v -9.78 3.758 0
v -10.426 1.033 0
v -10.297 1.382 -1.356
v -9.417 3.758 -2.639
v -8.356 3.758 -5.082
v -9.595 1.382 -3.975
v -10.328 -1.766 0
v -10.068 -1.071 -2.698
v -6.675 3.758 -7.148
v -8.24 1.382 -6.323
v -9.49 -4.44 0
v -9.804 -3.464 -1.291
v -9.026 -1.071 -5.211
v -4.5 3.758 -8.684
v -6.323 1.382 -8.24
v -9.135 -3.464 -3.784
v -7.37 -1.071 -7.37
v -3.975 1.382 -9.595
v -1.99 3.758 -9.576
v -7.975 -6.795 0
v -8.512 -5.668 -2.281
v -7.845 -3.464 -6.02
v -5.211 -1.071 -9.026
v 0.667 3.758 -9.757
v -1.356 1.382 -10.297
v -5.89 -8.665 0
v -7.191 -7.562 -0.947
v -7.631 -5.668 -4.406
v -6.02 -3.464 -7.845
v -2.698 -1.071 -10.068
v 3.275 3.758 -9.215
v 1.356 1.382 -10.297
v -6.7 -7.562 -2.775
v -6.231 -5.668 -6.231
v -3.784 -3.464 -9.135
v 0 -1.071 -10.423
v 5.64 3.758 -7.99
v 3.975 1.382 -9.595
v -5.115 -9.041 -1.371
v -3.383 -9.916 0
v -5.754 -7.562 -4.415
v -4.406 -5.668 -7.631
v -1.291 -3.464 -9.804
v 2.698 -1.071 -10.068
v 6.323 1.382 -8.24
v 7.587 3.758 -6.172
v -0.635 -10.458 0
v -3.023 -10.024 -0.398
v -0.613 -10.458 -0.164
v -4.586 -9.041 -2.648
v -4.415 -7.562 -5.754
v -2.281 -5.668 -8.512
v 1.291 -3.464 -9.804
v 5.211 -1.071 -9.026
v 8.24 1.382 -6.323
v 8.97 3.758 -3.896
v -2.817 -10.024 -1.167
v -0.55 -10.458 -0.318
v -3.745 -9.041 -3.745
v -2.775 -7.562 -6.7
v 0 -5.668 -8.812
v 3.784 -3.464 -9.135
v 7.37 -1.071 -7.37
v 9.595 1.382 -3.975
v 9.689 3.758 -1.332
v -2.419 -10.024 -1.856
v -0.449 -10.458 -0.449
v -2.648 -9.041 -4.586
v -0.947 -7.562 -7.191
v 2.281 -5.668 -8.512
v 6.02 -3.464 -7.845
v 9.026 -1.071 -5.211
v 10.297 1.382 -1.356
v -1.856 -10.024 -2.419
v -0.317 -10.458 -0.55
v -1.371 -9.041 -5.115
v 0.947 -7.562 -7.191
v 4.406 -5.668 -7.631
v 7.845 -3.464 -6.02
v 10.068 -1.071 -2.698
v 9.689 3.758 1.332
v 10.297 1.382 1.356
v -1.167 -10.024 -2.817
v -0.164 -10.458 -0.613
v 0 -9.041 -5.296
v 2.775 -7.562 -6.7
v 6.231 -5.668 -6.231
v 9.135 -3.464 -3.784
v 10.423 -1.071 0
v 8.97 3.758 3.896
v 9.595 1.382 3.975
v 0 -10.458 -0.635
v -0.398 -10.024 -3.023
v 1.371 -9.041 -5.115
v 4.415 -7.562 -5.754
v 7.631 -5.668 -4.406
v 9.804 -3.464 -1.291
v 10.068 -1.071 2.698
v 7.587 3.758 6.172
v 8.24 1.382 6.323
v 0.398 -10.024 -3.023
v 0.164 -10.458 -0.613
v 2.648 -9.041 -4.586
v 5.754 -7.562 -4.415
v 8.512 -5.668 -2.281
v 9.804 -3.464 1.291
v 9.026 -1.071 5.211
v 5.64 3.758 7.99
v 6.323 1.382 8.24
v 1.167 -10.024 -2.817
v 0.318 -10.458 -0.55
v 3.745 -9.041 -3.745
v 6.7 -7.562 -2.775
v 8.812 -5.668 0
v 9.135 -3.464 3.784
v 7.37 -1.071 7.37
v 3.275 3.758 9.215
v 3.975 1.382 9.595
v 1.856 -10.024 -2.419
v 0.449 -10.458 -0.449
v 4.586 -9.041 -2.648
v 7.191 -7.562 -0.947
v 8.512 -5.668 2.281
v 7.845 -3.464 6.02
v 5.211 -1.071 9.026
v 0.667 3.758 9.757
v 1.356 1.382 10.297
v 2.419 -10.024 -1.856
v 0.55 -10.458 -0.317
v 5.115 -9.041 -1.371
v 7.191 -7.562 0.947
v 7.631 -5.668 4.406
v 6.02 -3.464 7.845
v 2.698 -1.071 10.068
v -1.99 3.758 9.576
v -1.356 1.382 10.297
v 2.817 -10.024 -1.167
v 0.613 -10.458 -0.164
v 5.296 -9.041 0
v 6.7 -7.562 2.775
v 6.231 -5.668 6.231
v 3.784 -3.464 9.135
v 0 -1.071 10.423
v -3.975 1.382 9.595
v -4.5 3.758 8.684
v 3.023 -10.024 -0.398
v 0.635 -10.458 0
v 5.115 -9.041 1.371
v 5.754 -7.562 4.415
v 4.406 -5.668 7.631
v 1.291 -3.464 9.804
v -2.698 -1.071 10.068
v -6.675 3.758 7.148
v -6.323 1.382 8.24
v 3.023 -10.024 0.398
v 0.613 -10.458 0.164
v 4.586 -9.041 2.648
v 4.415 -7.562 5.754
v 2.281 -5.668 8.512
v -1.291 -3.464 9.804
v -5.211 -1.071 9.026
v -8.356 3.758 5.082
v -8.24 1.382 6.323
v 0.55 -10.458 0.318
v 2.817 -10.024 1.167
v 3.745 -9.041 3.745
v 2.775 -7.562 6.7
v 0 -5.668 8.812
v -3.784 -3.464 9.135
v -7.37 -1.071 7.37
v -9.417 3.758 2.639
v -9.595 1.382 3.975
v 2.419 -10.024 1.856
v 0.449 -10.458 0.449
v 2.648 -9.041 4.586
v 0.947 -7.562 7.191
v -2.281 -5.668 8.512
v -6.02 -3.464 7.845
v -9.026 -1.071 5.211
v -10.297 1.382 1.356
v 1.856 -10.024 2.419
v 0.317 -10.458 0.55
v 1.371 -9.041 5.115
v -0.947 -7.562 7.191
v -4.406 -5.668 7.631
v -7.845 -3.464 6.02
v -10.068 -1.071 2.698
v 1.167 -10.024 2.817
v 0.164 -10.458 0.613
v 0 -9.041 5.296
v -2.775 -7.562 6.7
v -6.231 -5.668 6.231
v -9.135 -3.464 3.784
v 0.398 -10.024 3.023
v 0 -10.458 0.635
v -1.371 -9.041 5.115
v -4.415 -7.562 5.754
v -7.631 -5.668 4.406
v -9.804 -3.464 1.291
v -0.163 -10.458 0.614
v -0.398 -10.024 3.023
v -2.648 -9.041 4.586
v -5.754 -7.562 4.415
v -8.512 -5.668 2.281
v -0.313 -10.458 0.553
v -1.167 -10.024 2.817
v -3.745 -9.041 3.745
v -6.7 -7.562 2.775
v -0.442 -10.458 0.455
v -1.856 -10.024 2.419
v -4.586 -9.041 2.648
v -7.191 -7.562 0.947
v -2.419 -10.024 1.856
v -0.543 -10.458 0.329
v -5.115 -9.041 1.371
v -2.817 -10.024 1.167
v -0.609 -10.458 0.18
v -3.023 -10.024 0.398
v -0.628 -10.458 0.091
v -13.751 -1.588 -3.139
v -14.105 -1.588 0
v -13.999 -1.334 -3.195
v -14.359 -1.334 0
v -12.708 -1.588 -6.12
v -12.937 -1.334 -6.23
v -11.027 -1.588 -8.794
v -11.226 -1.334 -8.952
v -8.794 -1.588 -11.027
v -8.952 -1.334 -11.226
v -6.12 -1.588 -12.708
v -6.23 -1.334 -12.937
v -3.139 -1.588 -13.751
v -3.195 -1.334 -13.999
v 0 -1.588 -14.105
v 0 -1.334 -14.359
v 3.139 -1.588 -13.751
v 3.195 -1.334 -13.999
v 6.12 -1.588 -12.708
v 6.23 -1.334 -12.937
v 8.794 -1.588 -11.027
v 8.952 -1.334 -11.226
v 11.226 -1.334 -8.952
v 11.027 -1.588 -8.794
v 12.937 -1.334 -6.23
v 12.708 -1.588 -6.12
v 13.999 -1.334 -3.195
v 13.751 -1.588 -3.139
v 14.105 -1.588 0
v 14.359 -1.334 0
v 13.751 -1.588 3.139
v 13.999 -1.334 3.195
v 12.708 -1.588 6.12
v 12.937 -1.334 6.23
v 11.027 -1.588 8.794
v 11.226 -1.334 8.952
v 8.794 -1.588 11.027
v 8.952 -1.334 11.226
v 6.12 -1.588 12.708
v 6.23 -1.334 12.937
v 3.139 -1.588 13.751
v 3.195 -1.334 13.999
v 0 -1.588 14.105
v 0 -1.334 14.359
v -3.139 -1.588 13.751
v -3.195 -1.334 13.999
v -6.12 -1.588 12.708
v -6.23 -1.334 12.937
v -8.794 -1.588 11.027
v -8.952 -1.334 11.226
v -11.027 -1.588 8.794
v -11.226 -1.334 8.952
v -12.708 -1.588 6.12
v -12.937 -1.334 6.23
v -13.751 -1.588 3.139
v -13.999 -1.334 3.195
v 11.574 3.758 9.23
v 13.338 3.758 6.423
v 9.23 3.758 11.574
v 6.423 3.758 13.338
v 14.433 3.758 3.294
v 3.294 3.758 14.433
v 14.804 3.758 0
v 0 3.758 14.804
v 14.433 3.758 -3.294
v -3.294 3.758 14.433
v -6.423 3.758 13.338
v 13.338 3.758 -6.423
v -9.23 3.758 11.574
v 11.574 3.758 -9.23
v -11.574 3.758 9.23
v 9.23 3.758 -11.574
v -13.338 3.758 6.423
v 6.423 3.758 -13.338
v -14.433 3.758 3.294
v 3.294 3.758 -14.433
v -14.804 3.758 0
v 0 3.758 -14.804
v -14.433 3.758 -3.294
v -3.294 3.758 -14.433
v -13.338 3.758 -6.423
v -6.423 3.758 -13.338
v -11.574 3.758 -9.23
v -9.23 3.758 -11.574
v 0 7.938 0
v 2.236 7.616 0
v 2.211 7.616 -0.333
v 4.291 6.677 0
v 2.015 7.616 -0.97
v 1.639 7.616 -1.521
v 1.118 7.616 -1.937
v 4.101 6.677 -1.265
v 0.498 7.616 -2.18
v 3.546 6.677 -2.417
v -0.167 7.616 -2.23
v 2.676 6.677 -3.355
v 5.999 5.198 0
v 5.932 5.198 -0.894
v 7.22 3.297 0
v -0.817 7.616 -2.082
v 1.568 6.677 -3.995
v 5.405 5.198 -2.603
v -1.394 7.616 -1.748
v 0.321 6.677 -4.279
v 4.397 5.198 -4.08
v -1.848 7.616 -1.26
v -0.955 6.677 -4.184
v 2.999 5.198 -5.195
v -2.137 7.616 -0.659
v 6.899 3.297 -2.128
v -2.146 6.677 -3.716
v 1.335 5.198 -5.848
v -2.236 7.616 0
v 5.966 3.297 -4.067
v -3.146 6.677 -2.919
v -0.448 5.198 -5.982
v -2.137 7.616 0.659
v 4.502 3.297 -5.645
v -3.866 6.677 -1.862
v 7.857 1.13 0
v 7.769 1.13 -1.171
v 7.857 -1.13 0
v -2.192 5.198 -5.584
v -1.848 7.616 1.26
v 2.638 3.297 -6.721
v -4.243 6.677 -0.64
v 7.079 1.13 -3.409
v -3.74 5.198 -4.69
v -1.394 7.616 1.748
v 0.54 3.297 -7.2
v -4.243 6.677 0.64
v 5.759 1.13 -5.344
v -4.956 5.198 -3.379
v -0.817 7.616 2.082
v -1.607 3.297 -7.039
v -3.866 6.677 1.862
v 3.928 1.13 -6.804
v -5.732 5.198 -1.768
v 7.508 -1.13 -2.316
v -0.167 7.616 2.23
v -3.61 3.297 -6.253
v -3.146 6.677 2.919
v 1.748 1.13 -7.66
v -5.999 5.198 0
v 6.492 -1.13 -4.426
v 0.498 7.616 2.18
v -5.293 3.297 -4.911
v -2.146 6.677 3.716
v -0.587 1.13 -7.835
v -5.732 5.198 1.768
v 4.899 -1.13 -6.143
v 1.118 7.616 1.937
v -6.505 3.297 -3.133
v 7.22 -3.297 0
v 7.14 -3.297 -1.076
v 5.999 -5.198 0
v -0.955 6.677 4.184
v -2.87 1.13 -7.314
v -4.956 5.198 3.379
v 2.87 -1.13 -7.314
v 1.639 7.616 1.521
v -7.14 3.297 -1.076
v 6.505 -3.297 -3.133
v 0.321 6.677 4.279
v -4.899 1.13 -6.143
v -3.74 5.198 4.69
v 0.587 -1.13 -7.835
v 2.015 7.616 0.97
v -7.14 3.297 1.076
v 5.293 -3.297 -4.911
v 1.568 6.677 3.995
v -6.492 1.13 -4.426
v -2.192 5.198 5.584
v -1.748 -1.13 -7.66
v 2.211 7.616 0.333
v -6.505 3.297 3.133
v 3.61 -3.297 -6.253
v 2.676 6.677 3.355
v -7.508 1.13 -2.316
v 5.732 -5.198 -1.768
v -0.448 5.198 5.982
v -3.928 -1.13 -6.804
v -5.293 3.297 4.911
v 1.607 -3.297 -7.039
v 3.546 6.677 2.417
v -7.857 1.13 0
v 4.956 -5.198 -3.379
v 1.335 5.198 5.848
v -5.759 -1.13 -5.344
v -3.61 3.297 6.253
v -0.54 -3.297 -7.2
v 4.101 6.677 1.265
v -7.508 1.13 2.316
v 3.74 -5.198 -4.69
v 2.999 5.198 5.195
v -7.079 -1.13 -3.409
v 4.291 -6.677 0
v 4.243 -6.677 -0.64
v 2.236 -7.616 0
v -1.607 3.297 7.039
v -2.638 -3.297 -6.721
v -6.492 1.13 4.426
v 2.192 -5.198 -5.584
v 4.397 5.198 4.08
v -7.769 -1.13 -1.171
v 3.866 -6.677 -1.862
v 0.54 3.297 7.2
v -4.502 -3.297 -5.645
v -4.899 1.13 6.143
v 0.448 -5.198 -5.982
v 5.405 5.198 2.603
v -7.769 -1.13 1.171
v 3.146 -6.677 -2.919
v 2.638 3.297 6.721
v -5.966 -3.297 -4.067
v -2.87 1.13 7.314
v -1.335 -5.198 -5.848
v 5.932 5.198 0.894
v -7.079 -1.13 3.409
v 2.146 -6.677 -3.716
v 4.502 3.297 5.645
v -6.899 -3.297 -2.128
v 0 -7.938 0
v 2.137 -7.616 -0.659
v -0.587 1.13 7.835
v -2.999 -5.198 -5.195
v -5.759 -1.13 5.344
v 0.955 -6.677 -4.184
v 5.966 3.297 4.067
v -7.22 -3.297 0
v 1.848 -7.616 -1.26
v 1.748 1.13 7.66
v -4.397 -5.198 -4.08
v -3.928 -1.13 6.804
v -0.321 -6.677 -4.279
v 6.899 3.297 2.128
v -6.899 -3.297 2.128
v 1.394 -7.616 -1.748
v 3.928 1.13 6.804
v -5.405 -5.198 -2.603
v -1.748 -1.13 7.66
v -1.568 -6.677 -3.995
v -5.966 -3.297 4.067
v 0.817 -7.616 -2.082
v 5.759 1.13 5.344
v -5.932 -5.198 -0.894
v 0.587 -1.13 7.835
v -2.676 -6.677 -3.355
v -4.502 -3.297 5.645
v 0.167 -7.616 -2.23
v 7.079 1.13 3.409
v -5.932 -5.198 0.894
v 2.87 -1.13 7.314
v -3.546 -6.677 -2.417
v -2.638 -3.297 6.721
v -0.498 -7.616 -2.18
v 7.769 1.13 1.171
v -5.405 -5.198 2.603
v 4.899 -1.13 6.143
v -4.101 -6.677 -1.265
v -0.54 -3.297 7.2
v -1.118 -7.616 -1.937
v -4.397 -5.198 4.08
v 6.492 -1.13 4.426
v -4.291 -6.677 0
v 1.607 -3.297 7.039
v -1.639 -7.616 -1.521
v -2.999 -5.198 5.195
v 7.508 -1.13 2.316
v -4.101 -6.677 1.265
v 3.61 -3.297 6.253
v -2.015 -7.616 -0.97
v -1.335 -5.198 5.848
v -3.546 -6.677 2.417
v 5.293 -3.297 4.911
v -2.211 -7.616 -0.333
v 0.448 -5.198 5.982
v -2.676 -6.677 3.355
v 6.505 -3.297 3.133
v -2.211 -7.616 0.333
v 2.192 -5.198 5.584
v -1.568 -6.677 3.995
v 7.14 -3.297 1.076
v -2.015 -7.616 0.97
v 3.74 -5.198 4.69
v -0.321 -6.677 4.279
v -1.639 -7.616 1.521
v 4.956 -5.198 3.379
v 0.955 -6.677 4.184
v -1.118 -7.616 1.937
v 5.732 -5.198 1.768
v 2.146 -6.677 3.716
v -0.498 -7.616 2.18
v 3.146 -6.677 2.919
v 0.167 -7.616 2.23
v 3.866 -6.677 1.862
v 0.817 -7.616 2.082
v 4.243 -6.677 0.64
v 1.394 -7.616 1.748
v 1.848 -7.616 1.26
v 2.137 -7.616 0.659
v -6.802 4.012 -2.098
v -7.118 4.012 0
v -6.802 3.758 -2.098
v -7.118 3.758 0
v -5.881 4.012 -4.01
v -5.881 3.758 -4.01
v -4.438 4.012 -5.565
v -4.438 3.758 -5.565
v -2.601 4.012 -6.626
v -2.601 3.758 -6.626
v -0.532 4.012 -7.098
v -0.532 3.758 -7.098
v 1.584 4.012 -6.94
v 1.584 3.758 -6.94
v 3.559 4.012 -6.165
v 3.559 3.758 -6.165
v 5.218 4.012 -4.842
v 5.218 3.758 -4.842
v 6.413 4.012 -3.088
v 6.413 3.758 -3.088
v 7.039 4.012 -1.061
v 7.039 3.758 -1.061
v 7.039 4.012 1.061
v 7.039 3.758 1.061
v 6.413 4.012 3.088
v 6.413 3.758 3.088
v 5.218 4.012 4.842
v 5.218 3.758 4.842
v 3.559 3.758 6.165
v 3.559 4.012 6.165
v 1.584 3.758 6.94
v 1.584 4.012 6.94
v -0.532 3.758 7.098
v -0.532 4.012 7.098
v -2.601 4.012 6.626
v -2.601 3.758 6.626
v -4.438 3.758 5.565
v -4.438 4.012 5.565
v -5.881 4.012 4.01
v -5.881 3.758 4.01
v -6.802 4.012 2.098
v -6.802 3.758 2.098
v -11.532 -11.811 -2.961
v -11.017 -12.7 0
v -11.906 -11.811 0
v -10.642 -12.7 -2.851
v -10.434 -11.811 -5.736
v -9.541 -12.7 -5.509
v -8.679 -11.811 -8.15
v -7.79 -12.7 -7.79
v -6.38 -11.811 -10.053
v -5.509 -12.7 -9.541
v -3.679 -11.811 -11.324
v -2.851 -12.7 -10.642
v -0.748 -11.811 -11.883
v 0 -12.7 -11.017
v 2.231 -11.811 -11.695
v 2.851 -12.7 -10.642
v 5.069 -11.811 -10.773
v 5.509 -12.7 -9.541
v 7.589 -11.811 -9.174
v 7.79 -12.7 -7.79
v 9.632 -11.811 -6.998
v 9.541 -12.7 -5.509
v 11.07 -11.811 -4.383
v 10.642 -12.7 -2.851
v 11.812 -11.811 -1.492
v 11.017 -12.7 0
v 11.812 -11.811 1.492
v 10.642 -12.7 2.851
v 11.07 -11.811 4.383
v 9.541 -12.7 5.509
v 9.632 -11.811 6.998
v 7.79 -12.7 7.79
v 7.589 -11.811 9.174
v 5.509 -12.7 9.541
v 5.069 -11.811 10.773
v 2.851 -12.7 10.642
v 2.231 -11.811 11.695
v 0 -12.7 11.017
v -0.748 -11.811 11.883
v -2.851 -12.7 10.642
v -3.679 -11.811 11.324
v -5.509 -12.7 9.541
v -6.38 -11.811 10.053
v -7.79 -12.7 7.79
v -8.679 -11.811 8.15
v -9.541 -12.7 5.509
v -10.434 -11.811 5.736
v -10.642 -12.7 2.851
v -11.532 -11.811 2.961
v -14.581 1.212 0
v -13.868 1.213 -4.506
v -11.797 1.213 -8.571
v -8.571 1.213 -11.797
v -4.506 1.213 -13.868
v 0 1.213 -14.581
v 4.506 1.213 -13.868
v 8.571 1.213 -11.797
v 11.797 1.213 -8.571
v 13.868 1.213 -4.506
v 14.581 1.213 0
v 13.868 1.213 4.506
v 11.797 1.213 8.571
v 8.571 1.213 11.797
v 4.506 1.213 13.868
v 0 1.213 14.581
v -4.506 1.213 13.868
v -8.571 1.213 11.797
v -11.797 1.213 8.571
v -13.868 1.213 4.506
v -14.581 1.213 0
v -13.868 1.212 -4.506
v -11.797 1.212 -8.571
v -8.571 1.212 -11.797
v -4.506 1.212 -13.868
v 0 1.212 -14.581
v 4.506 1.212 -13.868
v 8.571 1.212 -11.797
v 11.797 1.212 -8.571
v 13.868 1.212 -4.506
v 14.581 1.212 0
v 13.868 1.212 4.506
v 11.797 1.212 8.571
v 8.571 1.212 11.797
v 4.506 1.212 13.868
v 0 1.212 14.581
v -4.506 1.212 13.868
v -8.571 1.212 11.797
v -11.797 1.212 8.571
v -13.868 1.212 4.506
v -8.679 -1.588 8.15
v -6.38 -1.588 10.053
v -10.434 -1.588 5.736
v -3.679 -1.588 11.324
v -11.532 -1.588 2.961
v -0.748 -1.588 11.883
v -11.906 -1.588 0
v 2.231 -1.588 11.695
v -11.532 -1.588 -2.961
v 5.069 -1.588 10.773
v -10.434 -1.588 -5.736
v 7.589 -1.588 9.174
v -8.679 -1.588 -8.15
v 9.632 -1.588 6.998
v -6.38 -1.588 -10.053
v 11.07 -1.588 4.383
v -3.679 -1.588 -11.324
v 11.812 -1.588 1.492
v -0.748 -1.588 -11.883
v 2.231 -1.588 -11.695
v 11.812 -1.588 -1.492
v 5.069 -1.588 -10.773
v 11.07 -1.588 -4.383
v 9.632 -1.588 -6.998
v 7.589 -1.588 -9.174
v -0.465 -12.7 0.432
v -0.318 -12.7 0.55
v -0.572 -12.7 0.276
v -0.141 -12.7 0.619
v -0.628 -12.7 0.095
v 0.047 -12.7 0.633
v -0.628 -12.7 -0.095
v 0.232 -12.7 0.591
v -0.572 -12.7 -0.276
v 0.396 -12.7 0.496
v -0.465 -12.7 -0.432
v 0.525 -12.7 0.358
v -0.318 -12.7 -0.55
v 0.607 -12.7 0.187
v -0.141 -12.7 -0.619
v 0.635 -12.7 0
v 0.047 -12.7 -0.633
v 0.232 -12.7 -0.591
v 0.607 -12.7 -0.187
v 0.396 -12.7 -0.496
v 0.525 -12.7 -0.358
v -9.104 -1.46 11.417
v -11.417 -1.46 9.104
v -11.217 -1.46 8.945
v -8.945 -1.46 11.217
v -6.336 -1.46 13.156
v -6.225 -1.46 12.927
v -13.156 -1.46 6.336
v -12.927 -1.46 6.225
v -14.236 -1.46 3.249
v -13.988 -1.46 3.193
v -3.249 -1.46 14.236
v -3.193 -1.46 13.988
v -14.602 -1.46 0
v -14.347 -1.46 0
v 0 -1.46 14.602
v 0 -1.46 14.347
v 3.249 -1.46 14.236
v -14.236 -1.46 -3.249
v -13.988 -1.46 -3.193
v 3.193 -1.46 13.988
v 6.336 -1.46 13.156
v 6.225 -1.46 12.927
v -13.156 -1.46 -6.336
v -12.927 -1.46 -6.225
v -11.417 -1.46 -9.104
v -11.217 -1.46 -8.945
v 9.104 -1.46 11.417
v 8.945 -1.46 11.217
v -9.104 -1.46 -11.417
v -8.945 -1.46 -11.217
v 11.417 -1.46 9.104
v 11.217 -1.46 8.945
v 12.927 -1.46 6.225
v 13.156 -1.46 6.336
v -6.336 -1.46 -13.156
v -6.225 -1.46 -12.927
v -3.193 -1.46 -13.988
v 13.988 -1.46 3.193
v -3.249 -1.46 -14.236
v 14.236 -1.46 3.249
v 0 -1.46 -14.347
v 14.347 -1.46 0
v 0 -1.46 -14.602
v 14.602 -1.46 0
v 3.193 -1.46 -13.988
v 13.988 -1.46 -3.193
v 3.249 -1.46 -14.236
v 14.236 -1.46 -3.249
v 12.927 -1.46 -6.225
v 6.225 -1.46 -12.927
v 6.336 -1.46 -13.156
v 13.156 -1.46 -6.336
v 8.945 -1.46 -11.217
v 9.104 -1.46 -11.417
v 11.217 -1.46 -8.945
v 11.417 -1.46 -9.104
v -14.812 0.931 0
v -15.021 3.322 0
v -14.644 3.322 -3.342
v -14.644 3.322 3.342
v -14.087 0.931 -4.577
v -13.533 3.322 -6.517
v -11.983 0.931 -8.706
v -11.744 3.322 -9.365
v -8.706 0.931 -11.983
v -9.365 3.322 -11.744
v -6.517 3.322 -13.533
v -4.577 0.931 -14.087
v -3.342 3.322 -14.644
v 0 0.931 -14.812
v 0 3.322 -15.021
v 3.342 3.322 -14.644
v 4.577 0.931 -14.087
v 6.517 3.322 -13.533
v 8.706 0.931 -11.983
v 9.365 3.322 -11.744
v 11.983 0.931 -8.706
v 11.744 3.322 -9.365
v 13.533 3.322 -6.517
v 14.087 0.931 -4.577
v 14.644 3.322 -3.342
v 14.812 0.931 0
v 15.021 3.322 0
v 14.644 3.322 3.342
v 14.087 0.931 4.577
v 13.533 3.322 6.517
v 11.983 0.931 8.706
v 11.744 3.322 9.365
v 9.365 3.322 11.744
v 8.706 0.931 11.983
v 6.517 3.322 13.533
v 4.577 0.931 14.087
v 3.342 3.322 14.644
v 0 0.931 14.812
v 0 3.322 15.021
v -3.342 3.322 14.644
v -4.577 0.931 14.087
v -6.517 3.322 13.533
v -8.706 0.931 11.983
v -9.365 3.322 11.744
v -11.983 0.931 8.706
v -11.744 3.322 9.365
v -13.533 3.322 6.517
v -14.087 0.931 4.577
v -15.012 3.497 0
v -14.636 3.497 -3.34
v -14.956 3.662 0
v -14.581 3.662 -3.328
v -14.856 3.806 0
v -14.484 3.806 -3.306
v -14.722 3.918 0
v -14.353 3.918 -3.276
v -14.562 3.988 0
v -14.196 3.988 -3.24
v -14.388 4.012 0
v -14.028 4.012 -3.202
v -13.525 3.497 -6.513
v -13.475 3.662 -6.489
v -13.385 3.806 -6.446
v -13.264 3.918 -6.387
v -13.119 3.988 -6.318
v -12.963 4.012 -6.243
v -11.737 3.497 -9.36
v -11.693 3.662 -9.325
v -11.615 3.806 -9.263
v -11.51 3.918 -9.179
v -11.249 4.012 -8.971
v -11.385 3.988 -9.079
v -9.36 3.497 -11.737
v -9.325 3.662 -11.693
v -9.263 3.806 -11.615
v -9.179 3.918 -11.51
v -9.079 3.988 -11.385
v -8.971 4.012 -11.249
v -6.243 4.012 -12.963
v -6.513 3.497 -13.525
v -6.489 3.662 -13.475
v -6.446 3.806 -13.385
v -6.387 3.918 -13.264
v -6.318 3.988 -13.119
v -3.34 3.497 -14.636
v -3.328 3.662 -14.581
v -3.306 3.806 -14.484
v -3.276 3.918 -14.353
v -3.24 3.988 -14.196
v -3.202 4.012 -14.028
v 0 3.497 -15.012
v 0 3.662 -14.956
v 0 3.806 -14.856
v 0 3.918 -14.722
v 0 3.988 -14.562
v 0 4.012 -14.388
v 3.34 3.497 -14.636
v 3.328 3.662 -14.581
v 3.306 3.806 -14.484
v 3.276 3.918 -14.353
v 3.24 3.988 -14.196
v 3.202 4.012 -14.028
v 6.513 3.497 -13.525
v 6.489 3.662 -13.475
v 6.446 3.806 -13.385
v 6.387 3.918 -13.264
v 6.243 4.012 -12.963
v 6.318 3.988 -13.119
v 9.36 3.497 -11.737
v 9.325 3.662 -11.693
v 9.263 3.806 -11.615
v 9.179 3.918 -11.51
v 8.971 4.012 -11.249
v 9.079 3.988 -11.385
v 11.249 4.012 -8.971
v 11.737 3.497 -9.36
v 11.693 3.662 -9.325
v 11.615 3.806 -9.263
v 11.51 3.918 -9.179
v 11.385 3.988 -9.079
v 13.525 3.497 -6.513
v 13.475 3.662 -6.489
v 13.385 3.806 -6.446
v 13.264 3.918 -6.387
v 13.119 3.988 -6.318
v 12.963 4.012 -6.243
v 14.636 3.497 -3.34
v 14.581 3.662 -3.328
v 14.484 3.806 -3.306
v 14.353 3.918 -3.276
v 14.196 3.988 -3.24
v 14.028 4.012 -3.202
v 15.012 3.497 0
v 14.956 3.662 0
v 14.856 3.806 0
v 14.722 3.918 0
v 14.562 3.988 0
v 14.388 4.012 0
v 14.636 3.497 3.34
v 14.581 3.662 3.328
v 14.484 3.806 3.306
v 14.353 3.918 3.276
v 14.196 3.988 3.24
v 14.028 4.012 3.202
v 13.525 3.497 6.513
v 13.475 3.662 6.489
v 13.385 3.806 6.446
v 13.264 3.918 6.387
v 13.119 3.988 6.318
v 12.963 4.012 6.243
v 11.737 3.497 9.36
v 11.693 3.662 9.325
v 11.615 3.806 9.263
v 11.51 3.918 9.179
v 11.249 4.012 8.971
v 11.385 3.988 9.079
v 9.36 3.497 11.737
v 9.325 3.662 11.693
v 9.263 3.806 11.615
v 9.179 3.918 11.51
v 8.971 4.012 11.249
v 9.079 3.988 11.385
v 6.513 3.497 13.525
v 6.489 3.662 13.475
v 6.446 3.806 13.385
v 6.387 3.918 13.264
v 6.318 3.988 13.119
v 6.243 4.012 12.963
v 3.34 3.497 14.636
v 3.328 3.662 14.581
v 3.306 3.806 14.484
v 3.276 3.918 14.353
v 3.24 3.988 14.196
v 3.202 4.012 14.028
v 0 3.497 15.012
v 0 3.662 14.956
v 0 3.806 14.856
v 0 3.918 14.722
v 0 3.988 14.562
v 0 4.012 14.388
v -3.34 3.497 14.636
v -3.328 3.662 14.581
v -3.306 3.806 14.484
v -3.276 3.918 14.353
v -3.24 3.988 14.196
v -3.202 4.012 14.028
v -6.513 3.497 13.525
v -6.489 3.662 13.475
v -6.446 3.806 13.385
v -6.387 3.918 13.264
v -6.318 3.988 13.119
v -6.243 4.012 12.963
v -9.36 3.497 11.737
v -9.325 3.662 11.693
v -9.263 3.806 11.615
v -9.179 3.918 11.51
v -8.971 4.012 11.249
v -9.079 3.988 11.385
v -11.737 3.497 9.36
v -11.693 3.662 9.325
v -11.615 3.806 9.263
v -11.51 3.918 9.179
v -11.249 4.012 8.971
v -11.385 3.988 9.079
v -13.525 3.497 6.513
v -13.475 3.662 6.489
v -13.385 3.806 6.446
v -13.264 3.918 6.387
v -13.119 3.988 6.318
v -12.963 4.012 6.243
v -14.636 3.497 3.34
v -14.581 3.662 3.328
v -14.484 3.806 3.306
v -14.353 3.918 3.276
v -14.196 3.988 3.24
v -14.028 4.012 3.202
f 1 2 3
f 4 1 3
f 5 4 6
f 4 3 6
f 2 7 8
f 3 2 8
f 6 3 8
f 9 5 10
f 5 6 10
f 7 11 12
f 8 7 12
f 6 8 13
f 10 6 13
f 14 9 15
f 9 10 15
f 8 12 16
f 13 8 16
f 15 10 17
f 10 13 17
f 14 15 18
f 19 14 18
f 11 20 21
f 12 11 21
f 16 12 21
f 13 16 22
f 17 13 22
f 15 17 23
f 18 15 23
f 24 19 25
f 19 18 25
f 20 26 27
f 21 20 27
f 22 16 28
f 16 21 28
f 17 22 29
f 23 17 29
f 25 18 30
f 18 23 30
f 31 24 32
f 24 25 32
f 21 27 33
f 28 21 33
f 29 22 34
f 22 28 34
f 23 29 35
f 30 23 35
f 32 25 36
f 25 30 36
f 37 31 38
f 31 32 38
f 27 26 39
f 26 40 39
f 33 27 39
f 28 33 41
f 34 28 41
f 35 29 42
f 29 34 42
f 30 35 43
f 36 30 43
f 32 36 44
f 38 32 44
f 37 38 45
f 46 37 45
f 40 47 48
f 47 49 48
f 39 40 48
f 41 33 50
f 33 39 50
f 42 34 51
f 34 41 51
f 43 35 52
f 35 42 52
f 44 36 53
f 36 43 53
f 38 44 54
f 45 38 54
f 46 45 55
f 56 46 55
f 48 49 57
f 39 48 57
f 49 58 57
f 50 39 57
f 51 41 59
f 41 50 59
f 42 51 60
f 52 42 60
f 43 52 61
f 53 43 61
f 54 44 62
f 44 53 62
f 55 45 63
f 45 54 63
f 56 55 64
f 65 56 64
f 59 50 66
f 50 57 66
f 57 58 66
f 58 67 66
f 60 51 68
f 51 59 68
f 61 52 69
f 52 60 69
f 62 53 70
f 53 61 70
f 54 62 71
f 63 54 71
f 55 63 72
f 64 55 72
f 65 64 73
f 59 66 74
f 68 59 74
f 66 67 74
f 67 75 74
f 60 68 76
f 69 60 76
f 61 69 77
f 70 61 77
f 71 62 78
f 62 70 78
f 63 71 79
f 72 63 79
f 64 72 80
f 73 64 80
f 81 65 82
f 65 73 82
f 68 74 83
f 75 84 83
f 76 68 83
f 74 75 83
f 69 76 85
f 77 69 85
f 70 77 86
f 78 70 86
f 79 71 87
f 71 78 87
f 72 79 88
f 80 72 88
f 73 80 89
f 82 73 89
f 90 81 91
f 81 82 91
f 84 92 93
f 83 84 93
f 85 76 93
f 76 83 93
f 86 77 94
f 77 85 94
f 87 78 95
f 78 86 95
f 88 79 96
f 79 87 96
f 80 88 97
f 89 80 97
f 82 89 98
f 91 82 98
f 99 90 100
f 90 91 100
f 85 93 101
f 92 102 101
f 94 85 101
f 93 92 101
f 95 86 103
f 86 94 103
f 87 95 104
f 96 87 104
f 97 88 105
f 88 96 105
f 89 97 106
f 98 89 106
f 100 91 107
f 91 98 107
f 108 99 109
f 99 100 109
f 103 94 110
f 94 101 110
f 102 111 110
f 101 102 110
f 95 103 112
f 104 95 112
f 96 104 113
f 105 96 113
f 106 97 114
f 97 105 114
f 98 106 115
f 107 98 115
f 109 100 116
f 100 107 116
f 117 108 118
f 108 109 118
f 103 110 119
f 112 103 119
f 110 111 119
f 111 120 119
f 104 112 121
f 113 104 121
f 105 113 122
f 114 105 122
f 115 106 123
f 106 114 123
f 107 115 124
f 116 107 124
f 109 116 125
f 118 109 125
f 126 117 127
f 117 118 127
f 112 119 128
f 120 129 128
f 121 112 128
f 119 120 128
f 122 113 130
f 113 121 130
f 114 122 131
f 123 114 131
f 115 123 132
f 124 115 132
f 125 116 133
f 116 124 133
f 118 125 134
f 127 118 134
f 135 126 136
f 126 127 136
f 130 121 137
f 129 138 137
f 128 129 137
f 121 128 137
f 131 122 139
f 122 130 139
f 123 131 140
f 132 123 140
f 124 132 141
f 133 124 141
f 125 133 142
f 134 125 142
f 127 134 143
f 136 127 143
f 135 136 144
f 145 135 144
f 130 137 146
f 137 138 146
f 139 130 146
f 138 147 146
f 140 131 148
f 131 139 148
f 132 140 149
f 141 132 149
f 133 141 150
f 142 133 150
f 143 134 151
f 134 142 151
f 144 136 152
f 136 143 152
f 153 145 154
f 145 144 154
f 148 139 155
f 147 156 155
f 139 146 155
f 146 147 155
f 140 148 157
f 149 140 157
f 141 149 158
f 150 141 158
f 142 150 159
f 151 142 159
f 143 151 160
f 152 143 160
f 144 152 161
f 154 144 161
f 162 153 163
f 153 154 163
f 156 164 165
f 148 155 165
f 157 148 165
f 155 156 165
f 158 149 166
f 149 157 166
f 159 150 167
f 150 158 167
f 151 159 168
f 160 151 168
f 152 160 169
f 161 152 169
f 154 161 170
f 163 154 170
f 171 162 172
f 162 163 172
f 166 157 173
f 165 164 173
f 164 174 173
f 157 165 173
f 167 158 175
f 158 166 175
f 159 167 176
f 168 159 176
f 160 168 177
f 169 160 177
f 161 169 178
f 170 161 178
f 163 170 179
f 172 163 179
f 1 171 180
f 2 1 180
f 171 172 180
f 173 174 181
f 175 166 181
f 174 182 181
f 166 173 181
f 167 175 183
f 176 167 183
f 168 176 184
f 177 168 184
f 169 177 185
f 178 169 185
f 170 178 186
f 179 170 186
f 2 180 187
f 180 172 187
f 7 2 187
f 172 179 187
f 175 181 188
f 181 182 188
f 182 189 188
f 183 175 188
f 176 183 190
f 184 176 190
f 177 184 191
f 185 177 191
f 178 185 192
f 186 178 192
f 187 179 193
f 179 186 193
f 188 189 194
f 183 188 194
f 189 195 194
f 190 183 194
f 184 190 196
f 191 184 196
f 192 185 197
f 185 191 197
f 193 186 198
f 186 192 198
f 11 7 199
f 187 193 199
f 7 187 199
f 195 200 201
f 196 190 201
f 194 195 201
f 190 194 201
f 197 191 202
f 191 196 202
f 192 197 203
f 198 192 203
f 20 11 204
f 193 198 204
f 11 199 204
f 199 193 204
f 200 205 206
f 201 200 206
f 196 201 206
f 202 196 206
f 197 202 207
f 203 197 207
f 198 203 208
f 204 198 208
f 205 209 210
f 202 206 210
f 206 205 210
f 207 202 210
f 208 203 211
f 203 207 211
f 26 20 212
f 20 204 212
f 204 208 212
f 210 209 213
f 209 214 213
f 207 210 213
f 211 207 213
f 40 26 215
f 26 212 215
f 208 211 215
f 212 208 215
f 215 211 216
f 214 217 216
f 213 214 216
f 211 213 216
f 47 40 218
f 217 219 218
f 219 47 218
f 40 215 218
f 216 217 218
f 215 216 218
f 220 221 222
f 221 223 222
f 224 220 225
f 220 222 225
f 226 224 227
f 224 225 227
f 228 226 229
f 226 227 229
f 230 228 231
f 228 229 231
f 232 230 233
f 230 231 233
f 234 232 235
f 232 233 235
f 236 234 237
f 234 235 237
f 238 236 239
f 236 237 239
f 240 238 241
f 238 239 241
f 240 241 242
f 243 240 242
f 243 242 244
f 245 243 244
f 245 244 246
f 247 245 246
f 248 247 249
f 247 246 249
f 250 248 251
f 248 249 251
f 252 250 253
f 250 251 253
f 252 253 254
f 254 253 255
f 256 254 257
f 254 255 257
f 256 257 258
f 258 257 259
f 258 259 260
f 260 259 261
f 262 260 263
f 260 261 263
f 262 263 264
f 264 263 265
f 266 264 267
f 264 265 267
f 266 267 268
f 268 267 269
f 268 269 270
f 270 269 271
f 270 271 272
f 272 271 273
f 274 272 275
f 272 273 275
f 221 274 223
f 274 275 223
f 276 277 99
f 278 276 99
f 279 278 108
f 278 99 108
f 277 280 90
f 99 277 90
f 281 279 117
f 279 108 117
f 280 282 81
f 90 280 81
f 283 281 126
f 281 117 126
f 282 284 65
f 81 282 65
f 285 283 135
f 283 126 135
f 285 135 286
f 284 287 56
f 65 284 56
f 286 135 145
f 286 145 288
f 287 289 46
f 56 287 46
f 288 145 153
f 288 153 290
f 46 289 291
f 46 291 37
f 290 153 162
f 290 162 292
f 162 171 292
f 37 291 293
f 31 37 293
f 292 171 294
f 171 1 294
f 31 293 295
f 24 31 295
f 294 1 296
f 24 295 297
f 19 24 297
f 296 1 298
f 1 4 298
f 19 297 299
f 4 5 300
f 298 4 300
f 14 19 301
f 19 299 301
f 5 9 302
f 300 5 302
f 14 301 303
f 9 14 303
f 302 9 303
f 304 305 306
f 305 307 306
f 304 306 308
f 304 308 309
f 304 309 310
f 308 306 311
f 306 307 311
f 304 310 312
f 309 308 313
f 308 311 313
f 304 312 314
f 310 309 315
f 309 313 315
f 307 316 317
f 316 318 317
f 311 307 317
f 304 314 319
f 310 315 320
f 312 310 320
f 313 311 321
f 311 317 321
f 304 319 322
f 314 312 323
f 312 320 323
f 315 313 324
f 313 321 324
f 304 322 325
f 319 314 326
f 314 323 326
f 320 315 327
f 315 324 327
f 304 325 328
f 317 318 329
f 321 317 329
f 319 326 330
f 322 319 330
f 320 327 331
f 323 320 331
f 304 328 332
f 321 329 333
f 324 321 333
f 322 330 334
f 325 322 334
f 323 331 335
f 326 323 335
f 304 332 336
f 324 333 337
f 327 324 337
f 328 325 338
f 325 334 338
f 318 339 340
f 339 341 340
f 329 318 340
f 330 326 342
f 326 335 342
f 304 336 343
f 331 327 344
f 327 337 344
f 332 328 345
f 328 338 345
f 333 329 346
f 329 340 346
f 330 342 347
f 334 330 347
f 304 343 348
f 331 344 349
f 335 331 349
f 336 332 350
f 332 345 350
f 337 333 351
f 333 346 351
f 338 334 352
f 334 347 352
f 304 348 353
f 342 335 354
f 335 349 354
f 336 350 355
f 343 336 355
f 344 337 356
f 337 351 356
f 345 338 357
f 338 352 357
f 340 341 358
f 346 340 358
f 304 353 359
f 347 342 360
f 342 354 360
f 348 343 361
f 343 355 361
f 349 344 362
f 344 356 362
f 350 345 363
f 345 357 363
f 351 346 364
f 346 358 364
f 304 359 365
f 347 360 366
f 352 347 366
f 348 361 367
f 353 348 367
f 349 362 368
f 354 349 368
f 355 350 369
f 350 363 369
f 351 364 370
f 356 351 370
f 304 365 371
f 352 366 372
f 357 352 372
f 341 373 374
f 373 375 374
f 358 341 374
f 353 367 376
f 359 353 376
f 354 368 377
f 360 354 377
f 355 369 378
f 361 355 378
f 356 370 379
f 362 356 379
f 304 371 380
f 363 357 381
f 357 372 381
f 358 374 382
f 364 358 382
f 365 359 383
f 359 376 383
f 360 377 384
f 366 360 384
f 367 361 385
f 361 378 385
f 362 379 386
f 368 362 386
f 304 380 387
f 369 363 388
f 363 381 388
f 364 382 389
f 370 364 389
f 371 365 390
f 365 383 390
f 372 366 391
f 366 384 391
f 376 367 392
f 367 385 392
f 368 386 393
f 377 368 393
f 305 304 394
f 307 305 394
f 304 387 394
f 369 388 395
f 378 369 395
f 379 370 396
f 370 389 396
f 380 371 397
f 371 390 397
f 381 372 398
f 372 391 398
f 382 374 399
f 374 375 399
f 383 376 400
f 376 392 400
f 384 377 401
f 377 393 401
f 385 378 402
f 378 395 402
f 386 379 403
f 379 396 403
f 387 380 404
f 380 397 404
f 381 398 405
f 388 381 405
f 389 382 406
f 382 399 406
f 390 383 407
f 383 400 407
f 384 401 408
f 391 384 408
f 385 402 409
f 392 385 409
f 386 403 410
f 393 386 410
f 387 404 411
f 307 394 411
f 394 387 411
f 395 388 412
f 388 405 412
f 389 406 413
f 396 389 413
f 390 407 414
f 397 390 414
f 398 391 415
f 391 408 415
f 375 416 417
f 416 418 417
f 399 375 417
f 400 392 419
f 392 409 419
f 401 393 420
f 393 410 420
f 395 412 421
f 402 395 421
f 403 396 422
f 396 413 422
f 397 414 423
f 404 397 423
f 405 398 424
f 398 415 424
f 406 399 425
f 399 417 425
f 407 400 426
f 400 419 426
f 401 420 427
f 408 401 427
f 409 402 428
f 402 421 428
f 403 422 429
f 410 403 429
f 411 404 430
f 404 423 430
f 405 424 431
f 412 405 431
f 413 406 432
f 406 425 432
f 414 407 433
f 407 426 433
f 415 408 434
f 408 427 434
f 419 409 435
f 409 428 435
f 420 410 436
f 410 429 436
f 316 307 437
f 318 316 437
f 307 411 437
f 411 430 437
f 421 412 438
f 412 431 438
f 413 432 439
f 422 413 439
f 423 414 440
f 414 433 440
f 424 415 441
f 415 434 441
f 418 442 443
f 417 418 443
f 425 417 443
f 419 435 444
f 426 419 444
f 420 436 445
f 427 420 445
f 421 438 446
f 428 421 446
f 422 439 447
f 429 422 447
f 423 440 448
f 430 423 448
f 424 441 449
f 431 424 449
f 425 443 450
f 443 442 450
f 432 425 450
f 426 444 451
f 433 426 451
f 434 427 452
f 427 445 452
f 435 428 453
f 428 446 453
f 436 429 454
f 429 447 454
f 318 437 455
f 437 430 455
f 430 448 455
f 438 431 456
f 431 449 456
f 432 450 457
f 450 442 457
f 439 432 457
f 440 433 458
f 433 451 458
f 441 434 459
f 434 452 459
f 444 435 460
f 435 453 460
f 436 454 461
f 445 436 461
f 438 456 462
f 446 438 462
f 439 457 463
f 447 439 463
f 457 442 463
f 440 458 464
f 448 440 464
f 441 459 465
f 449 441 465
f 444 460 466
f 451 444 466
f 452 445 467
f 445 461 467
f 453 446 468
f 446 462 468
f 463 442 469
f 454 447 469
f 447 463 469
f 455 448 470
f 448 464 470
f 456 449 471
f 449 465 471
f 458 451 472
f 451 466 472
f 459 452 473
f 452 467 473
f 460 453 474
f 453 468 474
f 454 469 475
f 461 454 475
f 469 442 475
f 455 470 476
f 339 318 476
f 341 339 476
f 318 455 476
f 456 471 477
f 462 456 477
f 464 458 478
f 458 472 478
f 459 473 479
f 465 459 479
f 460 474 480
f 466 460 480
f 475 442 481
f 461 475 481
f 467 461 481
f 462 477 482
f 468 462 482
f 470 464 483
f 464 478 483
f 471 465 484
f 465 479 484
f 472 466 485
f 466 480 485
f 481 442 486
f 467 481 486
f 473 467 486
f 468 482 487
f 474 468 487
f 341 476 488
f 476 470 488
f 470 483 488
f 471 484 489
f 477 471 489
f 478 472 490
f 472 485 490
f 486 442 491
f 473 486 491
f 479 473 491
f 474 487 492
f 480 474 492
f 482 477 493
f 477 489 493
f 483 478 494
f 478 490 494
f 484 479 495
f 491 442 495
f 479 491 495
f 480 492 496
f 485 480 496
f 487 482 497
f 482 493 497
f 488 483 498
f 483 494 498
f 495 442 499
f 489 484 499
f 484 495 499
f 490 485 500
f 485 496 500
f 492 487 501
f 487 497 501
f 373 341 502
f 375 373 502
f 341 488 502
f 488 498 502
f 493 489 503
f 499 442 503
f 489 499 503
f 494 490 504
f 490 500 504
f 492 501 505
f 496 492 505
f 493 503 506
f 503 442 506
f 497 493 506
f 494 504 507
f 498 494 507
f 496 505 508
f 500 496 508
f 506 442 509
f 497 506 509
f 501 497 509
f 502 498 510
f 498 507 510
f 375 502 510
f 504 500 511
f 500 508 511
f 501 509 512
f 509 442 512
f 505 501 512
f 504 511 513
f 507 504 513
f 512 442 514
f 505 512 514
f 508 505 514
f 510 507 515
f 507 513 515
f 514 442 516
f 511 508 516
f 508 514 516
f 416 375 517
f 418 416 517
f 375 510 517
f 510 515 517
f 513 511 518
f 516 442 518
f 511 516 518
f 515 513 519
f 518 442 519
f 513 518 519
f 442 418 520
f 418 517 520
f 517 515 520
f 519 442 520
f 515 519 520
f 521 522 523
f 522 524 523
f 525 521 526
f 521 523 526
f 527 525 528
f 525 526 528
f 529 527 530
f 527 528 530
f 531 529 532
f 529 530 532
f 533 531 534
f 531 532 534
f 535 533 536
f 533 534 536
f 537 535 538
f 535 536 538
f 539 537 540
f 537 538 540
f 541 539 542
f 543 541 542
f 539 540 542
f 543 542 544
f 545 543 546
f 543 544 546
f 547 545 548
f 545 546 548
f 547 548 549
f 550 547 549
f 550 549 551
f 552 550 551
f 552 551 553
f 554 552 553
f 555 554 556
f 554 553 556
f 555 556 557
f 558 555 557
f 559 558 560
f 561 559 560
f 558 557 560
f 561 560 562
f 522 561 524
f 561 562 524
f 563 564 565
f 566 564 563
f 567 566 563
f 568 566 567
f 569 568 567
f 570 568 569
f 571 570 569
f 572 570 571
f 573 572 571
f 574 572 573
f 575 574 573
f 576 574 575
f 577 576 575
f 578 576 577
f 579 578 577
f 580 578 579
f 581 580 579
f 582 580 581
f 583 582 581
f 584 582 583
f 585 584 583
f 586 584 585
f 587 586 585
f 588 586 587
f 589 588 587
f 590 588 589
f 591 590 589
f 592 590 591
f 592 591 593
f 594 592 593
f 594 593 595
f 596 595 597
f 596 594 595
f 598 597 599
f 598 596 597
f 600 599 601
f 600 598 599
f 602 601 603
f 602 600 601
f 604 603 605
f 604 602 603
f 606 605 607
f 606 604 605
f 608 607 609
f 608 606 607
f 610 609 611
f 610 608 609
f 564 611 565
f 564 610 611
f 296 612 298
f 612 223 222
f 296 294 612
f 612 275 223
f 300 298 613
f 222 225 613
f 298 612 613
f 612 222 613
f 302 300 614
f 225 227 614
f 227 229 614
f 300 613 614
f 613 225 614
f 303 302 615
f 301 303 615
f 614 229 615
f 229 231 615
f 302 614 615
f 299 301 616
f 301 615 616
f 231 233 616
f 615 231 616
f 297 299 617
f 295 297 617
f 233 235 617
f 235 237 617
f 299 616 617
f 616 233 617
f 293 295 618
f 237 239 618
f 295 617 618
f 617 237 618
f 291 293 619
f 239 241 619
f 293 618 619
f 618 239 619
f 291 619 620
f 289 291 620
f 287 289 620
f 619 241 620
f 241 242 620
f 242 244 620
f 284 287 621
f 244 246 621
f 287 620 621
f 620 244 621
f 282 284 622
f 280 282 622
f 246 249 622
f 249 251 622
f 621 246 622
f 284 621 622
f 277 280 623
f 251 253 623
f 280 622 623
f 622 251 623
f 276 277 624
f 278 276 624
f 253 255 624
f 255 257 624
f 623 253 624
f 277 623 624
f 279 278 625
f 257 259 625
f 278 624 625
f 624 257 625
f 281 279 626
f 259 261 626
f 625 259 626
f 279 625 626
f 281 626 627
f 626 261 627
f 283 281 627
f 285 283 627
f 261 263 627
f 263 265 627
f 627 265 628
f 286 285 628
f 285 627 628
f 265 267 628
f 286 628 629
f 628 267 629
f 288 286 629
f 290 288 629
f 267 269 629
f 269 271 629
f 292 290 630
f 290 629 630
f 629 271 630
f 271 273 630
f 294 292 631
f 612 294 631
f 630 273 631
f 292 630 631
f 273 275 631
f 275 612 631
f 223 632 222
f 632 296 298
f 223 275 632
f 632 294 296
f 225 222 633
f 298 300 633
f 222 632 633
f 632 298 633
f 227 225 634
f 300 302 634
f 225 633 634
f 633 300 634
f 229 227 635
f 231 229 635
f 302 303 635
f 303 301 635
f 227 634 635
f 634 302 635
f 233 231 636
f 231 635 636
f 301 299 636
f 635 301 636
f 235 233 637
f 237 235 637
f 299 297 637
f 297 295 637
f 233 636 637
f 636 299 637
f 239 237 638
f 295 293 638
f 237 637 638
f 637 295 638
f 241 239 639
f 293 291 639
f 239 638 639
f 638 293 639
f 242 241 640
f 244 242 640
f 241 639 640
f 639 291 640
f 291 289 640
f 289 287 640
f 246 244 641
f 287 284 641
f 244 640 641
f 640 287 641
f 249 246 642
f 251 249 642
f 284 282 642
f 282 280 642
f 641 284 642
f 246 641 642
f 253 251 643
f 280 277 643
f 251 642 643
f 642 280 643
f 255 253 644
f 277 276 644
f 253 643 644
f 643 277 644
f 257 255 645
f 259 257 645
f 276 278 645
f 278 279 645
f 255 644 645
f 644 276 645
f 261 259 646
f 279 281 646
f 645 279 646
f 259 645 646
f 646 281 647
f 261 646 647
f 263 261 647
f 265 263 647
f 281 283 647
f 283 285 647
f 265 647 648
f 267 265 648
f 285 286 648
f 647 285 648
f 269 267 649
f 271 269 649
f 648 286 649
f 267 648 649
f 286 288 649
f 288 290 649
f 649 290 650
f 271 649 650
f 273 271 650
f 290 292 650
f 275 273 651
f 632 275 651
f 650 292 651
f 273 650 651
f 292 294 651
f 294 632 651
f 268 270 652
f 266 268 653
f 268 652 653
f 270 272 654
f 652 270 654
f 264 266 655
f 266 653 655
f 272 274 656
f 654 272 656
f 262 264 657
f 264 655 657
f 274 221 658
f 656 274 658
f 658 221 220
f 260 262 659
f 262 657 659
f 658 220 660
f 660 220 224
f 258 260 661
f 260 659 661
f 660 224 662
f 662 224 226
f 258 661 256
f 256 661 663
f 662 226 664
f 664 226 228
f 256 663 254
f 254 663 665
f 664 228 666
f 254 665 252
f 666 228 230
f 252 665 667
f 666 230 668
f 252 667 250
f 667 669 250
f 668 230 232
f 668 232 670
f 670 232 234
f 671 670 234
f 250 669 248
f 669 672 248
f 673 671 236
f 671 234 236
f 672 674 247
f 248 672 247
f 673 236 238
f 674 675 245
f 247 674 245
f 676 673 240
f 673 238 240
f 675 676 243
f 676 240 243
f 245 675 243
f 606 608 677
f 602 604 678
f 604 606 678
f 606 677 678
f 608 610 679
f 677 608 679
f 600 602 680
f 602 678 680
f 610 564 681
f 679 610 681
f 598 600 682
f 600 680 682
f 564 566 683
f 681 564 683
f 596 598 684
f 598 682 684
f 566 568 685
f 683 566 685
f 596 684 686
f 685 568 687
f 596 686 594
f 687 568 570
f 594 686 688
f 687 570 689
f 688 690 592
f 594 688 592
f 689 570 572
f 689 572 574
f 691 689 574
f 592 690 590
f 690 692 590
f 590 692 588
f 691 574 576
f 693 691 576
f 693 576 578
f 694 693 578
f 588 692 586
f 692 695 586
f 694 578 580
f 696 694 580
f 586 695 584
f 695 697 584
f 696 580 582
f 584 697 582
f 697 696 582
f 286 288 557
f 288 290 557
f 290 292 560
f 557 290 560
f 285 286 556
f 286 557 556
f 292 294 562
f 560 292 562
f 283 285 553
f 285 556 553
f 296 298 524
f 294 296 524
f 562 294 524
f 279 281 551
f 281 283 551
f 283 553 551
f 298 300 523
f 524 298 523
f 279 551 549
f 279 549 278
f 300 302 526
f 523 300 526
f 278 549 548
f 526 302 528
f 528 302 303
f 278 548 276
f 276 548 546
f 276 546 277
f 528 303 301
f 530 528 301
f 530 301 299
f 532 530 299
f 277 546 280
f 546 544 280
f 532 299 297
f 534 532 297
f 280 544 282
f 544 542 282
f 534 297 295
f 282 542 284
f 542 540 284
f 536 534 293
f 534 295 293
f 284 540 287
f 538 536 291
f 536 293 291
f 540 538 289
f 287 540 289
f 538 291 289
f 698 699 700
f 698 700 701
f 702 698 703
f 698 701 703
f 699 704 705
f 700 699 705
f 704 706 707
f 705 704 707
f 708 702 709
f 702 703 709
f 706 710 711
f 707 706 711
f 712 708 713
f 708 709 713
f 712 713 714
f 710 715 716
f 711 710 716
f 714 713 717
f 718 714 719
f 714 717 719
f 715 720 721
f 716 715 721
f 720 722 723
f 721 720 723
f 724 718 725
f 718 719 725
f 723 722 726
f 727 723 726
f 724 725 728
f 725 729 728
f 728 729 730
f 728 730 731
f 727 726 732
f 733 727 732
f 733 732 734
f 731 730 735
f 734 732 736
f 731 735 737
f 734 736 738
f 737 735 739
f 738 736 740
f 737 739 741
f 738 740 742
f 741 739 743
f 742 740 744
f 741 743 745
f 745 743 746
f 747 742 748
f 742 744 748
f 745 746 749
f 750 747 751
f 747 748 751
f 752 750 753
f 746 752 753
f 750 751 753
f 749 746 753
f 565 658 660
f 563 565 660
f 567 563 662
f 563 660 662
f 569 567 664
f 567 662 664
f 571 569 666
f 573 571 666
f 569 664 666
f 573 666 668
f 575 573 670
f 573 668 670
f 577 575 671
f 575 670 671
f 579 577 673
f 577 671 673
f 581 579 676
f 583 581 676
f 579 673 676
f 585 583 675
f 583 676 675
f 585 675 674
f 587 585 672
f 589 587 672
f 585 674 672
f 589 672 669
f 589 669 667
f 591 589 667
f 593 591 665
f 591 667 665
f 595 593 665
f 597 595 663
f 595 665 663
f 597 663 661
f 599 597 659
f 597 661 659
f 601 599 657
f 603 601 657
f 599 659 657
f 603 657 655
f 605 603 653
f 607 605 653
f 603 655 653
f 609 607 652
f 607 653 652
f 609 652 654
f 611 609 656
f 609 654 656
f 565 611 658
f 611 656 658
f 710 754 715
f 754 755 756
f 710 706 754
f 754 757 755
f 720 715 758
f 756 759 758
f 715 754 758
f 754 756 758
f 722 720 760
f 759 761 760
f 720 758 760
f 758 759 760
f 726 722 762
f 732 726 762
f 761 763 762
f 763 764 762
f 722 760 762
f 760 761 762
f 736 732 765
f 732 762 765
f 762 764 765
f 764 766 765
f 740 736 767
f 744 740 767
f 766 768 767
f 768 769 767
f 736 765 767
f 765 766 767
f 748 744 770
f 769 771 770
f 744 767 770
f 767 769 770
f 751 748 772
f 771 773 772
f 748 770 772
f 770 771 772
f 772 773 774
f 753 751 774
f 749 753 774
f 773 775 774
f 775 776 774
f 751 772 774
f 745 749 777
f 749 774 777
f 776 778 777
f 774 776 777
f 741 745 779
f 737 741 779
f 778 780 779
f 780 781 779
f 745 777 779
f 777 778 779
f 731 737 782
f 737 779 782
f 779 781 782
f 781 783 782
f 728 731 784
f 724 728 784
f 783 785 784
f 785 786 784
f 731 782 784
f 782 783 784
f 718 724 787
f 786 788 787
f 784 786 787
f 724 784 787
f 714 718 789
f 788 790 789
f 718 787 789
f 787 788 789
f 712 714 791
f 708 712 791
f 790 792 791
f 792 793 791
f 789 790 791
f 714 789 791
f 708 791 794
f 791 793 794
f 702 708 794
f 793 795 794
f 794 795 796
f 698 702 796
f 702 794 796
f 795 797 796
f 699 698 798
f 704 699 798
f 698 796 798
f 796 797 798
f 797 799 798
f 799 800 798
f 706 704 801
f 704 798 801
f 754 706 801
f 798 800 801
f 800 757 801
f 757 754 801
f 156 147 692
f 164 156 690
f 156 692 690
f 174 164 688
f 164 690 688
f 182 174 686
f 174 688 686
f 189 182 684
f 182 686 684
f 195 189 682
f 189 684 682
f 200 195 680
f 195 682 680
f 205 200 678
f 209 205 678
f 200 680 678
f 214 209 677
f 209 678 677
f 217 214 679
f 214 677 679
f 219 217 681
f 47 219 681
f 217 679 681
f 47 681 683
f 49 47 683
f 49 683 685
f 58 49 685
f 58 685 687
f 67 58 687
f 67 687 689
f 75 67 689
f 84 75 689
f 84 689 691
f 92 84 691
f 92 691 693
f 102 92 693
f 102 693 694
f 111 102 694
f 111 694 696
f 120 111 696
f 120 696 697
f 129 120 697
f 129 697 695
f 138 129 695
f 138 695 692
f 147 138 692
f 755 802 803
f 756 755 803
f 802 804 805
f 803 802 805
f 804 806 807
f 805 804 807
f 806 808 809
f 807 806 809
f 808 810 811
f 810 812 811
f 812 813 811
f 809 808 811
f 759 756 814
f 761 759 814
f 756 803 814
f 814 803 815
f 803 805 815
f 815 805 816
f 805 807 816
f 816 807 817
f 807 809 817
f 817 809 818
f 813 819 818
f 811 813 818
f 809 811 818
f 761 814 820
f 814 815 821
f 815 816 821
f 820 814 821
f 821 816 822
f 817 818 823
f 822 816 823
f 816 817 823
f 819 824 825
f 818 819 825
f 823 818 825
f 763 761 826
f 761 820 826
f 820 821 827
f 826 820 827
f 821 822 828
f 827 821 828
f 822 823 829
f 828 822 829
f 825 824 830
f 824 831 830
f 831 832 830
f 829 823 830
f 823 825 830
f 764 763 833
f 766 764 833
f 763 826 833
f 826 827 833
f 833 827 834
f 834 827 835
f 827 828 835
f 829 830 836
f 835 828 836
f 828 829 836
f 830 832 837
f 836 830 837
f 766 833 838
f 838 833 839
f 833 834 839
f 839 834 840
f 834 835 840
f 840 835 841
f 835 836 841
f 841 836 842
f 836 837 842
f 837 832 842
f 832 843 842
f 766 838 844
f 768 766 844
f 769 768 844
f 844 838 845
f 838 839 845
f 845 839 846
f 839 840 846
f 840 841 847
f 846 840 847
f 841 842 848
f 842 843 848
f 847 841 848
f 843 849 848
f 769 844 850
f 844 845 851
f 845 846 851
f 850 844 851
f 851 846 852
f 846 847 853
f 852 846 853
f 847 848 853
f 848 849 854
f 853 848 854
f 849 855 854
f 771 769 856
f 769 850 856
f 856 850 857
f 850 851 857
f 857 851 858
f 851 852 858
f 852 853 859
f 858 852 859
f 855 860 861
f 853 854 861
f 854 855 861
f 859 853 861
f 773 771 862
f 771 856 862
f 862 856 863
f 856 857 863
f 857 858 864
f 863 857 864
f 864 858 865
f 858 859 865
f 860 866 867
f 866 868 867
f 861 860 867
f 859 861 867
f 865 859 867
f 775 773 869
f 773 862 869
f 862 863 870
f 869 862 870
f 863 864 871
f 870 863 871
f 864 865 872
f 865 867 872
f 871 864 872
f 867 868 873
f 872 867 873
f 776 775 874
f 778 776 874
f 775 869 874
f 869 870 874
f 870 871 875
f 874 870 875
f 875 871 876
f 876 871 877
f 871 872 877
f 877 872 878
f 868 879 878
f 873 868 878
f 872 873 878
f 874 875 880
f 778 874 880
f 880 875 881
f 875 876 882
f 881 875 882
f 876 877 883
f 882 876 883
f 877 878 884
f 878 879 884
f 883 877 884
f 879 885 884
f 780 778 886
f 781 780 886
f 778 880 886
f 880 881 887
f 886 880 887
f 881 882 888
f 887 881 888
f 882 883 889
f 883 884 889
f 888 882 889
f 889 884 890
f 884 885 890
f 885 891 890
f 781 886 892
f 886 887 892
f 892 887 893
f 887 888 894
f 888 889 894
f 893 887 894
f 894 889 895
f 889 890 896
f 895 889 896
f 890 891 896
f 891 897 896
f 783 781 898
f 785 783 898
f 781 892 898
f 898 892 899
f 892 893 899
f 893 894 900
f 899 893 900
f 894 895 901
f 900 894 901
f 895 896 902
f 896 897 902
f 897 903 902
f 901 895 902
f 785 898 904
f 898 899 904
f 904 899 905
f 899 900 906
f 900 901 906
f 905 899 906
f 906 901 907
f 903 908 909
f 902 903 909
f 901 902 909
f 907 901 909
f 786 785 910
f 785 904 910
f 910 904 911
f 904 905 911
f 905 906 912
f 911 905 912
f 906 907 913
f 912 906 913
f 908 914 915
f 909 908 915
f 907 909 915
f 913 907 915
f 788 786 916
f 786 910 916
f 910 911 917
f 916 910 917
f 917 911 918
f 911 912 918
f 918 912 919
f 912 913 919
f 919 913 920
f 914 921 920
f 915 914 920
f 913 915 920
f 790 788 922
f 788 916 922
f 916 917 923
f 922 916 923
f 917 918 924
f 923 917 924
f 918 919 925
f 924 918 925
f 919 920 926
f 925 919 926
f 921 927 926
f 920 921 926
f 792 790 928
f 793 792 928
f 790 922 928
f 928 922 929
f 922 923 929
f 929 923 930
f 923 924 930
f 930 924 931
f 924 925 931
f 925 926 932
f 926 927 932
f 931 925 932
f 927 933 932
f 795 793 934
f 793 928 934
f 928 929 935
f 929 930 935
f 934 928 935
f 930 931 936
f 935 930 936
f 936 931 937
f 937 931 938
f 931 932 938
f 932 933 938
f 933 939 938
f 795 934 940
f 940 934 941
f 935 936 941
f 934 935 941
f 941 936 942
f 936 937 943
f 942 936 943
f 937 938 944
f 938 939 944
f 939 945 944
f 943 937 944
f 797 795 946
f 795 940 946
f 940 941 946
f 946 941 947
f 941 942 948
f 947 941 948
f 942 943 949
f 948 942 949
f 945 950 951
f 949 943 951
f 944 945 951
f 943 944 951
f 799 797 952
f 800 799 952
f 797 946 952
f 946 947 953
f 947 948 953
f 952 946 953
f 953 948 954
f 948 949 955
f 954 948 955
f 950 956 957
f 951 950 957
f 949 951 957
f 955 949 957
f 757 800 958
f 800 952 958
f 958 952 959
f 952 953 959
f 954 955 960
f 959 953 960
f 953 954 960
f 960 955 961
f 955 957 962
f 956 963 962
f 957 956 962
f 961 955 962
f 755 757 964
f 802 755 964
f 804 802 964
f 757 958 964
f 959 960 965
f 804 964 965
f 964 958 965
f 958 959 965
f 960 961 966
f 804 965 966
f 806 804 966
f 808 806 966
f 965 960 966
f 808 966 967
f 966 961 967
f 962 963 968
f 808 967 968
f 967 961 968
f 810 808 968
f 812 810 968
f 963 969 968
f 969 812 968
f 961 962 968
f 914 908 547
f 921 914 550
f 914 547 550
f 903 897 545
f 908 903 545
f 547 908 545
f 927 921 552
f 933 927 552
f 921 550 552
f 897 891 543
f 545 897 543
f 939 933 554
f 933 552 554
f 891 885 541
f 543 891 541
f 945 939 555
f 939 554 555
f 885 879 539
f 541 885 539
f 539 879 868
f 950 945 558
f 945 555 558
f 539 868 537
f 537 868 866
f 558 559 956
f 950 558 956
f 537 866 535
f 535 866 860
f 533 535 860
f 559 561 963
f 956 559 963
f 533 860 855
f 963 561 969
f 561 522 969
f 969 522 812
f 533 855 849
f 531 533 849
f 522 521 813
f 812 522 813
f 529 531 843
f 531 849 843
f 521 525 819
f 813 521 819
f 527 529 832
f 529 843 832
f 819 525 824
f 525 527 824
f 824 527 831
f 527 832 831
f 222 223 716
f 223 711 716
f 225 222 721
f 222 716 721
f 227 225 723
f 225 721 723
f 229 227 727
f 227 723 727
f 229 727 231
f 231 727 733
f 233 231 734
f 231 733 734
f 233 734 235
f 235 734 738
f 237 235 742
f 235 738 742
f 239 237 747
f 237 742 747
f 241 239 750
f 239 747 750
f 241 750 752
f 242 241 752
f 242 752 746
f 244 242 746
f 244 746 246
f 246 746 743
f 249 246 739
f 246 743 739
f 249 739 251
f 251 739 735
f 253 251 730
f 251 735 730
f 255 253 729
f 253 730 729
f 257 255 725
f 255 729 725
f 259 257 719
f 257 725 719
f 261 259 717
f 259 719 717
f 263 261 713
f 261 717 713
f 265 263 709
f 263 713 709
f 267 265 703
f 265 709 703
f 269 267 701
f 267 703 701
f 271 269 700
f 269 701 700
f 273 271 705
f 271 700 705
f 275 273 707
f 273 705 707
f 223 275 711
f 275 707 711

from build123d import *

# Parameters (mm, degrees)
SKETCH6_R          = 0.635
CUT_EXTRUDE1_DEPTH = 30.678184065
CHAMFER1_SIZE      = 0.889
FILLET1_R          = 0.635


with BuildPart() as part:
    # Sketch2 → Revolve1 (revolve)
    with BuildSketch(Plane.XY):
        with BuildLine():
            Line((0, -7.9375), (0, 7.9375))
            ThreePointArc((0, 7.9375), (7.9375, 0), (0, -7.9375))
        make_face()
    revolve(axis=Axis((0, -7.9375, 0), (0, 1, 0)))


with BuildPart() as body_2:
    # Sketch3 → Revolve2 (revolve)
    with BuildSketch(Plane.XY, mode=Mode.PRIVATE) as revolve2_sk:
        Polygon((14.804057641, 3.7585), (14.358565366, -1.3335), (14.347454306, -1.4605), (14.602424545, -1.4605), (15.08125, 4.0125), (7.118250532, 4.0125), (7.118250532, 3.7585), align=None)
    revolve(revolve2_sk.sketch.rotate(Axis((0, 0, 0), (0, -1, 0)), 180), axis=Axis((0, 0, 0), (0, -1, 0)))

    # Fillet1
    fillet1_edges = [body_2.edges().sort_by_distance(p)[0] for p in [
        (15.08125, 4.0125, 0),
    ]]
    fillet(fillet1_edges, radius=FILLET1_R)


with BuildPart() as body_3:
    # Sketch4 → Revolve3 (revolve)
    with BuildSketch(Plane.XY, mode=Mode.PRIVATE) as revolve3_sk:
        with BuildLine():
            Line((11.90625, -1.5875), (14.104565366, -1.5875))
            Line((14.104565366, -1.5875), (14.358565366, -1.3335))
            Line((14.358565366, -1.3335), (14.804057641, 3.7585))
            Line((14.804057641, 3.7585), (9.780167892, 3.7585))
            ThreePointArc((9.780167892, 3.7585), (8.635904411, -5.932888104), (0, -10.4775))
            Line((0, -10.4775), (0, -12.7))
            Line((0, -12.7), (11.90625, -12.7))
            Line((11.90625, -12.7), (11.90625, -1.5875))
        make_face()
    revolve(revolve3_sk.sketch.rotate(Axis((0, 0, 0), (0, -1, 0)), 180), axis=Axis((0, 0, 0), (0, -1, 0)))

    # Sketch6 → Cut-Extrude1 (cut, through all)
    with BuildSketch(Plane.XZ.offset(12.7)):
        Circle(SKETCH6_R)
    extrude(amount=-CUT_EXTRUDE1_DEPTH, mode=Mode.SUBTRACT)

    # Chamfer1
    chamfer1_edges = [body_3.edges().sort_by_distance(p)[0] for p in [
        (11.90625, -12.7, 0),
    ]]
    chamfer(chamfer1_edges, length=CHAMFER1_SIZE)


solid = Compound([part.part, body_2.part, body_3.part])
